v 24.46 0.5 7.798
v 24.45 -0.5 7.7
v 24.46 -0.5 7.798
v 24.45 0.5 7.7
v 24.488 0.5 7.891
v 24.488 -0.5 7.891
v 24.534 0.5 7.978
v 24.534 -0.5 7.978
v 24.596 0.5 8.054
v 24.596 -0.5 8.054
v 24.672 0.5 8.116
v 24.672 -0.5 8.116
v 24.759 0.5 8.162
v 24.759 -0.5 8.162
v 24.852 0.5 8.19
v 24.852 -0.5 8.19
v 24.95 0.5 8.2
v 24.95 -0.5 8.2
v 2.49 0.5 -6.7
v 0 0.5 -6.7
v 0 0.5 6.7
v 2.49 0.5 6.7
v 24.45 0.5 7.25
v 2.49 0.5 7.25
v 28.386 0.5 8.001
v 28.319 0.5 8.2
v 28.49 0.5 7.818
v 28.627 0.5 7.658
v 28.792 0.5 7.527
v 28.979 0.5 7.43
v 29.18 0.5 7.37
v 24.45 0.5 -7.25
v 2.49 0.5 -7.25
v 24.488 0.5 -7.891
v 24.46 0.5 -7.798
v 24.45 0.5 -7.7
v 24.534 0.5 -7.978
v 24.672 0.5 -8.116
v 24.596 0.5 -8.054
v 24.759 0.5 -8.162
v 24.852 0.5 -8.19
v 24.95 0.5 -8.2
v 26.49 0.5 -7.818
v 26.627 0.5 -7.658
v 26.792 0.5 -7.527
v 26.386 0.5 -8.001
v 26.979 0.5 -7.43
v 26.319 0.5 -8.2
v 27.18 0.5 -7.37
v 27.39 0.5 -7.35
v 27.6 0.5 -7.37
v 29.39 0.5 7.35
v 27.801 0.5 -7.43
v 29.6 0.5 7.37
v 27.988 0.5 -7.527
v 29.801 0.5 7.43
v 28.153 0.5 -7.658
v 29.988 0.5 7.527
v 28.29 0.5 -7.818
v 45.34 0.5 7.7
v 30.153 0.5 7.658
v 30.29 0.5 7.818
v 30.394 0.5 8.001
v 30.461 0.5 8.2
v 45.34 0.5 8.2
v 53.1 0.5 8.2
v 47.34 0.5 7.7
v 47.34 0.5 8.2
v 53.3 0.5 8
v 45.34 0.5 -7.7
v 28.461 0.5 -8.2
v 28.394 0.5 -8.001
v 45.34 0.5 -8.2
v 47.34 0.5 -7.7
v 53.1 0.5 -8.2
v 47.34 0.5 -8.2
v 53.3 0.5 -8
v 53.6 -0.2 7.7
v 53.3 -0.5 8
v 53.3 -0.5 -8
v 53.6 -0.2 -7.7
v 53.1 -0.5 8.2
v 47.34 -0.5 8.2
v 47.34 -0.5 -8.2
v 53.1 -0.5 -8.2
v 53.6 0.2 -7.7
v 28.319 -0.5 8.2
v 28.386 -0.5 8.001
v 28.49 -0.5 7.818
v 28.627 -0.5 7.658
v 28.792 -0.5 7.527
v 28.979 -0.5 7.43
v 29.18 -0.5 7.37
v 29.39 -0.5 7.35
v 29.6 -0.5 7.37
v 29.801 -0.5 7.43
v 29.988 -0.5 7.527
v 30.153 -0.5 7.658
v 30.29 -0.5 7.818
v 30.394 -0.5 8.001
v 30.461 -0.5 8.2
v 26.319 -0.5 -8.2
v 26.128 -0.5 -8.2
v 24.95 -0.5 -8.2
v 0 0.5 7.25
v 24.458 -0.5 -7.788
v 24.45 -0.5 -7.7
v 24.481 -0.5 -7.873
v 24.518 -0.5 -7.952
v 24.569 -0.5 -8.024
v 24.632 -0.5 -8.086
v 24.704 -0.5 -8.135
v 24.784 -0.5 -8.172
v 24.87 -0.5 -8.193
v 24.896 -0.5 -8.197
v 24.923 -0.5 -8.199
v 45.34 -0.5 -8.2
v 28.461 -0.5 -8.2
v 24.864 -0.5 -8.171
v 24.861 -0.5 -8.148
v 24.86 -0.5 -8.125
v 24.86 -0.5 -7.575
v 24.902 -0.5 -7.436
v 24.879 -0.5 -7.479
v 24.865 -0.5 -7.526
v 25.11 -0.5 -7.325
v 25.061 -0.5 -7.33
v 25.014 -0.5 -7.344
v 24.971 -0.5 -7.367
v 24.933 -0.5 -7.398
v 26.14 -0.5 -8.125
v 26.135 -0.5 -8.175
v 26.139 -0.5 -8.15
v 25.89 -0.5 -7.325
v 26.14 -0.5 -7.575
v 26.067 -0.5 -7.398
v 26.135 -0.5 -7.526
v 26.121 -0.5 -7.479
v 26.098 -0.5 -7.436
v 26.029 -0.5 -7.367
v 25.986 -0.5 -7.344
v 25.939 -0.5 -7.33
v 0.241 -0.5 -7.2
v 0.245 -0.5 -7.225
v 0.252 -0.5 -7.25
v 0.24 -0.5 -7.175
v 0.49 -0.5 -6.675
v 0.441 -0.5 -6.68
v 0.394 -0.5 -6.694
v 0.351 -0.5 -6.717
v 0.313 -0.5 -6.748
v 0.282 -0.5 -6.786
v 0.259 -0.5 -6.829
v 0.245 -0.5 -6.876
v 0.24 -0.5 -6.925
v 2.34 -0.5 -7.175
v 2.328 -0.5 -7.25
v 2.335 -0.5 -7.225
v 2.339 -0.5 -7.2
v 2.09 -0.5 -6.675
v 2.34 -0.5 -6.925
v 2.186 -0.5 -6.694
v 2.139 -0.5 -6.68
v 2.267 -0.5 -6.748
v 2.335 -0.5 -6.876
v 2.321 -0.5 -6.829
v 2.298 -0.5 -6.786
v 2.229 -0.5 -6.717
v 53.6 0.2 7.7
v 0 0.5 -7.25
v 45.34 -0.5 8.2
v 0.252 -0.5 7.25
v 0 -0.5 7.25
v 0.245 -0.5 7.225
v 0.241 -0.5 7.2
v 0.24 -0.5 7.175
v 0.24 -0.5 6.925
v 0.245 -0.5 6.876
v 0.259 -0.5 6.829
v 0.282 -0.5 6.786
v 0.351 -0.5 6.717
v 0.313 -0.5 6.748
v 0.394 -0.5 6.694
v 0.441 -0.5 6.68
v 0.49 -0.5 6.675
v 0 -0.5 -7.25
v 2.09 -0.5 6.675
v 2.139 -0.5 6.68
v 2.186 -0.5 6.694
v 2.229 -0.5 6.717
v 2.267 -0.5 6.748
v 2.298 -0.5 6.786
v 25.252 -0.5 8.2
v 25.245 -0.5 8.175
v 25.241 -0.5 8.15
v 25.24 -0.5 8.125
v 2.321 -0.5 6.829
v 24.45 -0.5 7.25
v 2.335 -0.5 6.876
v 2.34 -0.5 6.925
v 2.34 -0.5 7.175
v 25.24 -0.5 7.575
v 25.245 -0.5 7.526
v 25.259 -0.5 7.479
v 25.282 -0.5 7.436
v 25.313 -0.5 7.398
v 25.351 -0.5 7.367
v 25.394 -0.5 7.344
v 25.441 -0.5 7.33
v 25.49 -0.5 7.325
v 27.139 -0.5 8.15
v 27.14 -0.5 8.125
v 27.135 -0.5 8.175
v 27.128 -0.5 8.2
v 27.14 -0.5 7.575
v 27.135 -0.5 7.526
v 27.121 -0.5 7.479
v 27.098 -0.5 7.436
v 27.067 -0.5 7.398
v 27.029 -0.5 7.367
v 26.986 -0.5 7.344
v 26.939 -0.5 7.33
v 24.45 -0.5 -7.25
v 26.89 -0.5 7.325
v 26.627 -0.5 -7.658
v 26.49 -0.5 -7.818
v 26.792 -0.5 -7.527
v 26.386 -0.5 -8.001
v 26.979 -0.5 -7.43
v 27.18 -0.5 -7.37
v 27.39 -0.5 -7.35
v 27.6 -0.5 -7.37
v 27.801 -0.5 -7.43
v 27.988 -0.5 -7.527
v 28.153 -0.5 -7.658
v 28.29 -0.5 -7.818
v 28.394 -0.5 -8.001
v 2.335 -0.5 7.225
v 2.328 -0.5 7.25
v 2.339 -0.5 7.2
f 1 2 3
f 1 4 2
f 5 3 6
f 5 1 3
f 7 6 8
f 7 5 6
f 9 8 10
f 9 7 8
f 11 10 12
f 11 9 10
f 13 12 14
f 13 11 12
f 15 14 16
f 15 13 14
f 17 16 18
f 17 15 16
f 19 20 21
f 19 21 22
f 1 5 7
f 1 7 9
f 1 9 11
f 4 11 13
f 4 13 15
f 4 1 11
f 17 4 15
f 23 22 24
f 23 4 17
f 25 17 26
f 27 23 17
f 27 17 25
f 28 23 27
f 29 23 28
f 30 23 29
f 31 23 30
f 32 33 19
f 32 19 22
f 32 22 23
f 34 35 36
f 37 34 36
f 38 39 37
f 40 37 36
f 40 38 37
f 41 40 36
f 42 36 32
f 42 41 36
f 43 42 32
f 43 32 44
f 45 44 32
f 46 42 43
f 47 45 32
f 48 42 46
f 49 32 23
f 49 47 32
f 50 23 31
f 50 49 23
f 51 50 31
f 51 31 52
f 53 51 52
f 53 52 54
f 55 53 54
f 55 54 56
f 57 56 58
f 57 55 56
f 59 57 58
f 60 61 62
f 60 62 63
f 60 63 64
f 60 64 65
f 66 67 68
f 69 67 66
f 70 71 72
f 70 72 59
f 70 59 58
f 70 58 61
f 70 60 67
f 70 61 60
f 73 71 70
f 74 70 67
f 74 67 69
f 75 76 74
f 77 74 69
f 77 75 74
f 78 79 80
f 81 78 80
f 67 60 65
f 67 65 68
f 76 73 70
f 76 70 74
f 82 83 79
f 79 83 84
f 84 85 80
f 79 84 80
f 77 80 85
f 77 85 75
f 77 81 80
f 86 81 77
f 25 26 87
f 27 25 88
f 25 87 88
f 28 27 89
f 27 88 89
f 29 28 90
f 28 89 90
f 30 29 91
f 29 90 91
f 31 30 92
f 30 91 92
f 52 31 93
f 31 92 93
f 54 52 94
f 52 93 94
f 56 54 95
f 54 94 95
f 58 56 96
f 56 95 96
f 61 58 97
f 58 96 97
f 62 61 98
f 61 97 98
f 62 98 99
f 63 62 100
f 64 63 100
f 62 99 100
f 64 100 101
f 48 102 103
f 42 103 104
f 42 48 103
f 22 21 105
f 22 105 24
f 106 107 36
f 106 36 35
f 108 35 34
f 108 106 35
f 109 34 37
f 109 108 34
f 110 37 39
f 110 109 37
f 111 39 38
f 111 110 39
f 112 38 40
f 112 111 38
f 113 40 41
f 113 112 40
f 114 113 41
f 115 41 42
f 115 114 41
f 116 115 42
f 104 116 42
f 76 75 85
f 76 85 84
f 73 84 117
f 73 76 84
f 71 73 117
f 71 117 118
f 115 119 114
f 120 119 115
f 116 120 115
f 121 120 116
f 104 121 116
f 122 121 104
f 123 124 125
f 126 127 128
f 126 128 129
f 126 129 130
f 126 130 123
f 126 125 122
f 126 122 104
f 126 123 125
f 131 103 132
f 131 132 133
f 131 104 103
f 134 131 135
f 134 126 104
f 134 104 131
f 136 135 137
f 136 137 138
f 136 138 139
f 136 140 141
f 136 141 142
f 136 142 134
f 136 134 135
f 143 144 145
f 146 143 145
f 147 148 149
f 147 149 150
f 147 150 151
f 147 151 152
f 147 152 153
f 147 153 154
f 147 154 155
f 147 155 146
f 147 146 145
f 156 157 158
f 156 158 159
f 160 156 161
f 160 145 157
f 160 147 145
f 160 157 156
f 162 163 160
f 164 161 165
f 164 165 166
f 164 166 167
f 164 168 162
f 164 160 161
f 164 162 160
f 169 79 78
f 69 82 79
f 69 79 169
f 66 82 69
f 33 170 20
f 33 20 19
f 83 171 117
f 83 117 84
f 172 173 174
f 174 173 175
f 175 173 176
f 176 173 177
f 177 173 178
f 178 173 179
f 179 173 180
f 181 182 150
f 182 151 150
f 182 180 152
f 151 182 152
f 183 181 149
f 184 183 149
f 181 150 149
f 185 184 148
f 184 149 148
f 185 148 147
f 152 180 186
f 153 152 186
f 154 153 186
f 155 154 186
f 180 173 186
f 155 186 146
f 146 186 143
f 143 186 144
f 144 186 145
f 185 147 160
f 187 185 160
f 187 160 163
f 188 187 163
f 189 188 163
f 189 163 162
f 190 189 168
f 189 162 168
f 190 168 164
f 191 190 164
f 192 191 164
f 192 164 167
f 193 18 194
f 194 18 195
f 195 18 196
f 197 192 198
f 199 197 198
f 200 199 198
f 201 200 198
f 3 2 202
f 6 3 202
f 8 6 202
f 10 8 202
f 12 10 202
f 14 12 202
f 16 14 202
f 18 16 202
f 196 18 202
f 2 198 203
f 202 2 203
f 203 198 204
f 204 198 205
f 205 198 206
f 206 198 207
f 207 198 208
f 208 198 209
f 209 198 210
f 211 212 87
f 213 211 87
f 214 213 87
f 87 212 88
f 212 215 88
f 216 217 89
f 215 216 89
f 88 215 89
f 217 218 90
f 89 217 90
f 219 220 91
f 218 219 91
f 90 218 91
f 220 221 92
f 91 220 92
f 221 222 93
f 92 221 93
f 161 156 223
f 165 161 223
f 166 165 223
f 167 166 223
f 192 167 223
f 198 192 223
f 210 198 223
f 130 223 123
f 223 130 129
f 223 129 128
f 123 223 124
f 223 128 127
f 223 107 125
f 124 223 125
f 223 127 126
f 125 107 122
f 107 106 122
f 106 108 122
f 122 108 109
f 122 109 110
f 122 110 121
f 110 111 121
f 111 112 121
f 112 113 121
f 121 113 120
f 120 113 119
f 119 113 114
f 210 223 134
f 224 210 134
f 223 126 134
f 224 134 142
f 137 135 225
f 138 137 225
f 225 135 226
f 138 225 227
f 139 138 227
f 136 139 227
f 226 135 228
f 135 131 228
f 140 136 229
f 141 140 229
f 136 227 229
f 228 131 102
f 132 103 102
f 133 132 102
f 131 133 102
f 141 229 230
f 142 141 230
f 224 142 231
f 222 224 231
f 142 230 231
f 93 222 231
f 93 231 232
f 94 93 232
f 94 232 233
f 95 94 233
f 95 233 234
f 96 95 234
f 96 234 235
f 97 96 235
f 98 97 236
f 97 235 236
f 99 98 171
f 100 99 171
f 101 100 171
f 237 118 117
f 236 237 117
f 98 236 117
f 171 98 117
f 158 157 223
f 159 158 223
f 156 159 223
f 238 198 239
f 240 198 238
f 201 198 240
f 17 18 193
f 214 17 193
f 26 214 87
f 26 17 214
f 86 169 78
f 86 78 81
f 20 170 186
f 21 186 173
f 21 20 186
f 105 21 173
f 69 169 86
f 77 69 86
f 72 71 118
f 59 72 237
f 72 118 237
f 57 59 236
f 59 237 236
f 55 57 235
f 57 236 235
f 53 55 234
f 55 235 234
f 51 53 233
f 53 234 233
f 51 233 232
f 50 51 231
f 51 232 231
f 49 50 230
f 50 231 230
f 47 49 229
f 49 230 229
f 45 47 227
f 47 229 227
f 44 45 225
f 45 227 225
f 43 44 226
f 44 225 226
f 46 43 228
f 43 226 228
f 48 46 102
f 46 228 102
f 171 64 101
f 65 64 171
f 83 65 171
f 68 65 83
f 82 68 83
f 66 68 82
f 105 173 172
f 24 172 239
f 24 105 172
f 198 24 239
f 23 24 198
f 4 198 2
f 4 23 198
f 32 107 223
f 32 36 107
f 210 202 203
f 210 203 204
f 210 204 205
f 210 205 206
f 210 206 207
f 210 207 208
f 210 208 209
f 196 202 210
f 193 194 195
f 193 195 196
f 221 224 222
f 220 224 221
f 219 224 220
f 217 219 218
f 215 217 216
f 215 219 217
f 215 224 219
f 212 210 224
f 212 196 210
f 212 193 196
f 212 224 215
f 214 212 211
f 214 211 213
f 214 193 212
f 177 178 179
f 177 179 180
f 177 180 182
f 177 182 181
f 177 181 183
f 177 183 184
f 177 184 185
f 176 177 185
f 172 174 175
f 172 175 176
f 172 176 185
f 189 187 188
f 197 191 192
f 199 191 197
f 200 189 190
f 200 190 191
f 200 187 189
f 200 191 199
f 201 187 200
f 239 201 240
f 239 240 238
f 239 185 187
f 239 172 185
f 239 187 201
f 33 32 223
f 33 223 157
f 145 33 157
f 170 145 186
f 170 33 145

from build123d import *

# Parameters (mm, degrees)
BOSS_EXTRUDE1_DEPTH = 0.5
CHAMFER3_SIZE       = 0.5
SKETCH2_R           = 1.1
CUT_EXTRUDE1_DEPTH  = 55.232831385
FILLET1_R           = 0.5
SKETCH8_W           = 2.49
SKETCH8_H           = 0.55
SKETCH8_W_2         = 2
SKETCH8_H_2         = 0.5
CUT_EXTRUDE3_DEPTH  = 0.0001
SKETCH9_W           = 2
SKETCH9_H           = 16.4
CUT_EXTRUDE4_DEPTH  = 0.0001
CHAMFER4_SIZE       = 0.3


with BuildPart() as part:
    # Sketch1 → Boss-Extrude1 (new, symmetric)
    with BuildSketch(Plane(origin=(0, 0, 0), x_dir=(1, 0, 0), z_dir=(0, 1, 0))):
        Polygon((0, 7.25), (0, -7.25), (24.45, -7.25), (24.45, -8.2), (53.6, -8.2), (53.6, 8.2), (24.45, 8.2), (24.45, 7.25), align=None)
    extrude(amount=BOSS_EXTRUDE1_DEPTH, both=True)

    # Chamfer3
    chamfer3_edges = [part.edges().sort_by_distance(p)[0] for p in [
        (53.6, 0, -8.2),
        (53.6, 0, 8.2),
    ]]
    chamfer(chamfer3_edges, length=CHAMFER3_SIZE)

    # Sketch2 → Cut-Extrude1 (cut, through all)
    with BuildSketch(Plane.XZ.offset(0.5)):
        with Locations((29.39, 8.45)):
            Circle(SKETCH2_R)
        with Locations((27.39, -8.45)):
            Circle(SKETCH2_R)
    extrude(amount=-CUT_EXTRUDE1_DEPTH, mode=Mode.SUBTRACT)

    # Fillet1
    fillet1_edges = [part.edges().sort_by_distance(p)[0] for p in [
        (24.45, 0, -8.2),
        (24.45, 0, 8.2),
    ]]
    fillet(fillet1_edges, radius=FILLET1_R)

    # Sketch8 → Cut-Extrude3 (cut)
    with BuildSketch(Plane(origin=(0, 0.5, 0), x_dir=(1, 0, 0), z_dir=(0, 1, 0))):
        with Locations((1.245, -6.975)):
            Rectangle(SKETCH8_W, SKETCH8_H)
        with Locations((1.245, 6.975)):
            Rectangle(SKETCH8_W, SKETCH8_H)
        with Locations((46.34, -7.95)):
            Rectangle(SKETCH8_W_2, SKETCH8_H_2)
        with Locations((46.34, 7.95)):
            Rectangle(SKETCH8_W_2, SKETCH8_H_2)
    extrude(amount=-CUT_EXTRUDE3_DEPTH, mode=Mode.SUBTRACT)

    # Sketch9 → Cut-Extrude4 (cut)
    with BuildSketch(Plane.XZ.offset(0.5)):
        with BuildLine():
            Line((2.09, 7.425), (0.49, 7.425))
            ThreePointArc((0.49, 7.425), (0.313223305, 7.351776695), (0.24, 7.175))
            Line((0.24, 7.175), (0.24, 6.925))
            ThreePointArc((0.24, 6.925), (0.313223305, 6.748223305), (0.49, 6.675))
            Line((0.49, 6.675), (2.09, 6.675))
            ThreePointArc((2.09, 6.675), (2.266776695, 6.748223305), (2.34, 6.925))
            Line((2.34, 6.925), (2.34, 7.175))
            ThreePointArc((2.34, 7.175), (2.266776695, 7.351776695), (2.09, 7.425))
        make_face()
        with BuildLine():
            Line((2.34, -7.175), (2.34, -6.925))
            ThreePointArc((2.34, -6.925), (2.266776695, -6.748223305), (2.09, -6.675))
            Line((2.09, -6.675), (0.49, -6.675))
            ThreePointArc((0.49, -6.675), (0.313223305, -6.748223305), (0.24, -6.925))
            Line((0.24, -6.925), (0.24, -7.175))
            ThreePointArc((0.24, -7.175), (0.313223305, -7.351776695), (0.49, -7.425))
            Line((0.49, -7.425), (2.09, -7.425))
            ThreePointArc((2.09, -7.425), (2.266776695, -7.351776695), (2.34, -7.175))
        make_face()
        with BuildLine():
            Line((26.14, -8.125), (26.14, -7.575))
            ThreePointArc((26.14, -7.575), (26.066776695, -7.398223305), (25.89, -7.325))
            Line((25.89, -7.325), (25.11, -7.325))
            ThreePointArc((25.11, -7.325), (24.933223305, -7.398223305), (24.86, -7.575))
            Line((24.86, -7.575), (24.86, -8.125))
            ThreePointArc((24.86, -8.125), (24.933223305, -8.301776695), (25.11, -8.375))
            Line((25.11, -8.375), (25.89, -8.375))
            ThreePointArc((25.89, -8.375), (26.066776695, -8.301776695), (26.14, -8.125))
        make_face()
        with Locations((46.34, 0)):
            Rectangle(SKETCH9_W, SKETCH9_H)
        with BuildLine():
            Line((25.49, 7.325), (26.89, 7.325))
            ThreePointArc((26.89, 7.325), (27.066776695, 7.398223305), (27.14, 7.575))
            Line((27.14, 7.575), (27.14, 8.125))
            ThreePointArc((27.14, 8.125), (27.066776695, 8.301776695), (26.89, 8.375))
            Line((26.89, 8.375), (25.49, 8.375))
            ThreePointArc((25.49, 8.375), (25.313223305, 8.301776695), (25.24, 8.125))
            Line((25.24, 8.125), (25.24, 7.575))
            ThreePointArc((25.24, 7.575), (25.313223305, 7.398223305), (25.49, 7.325))
        make_face()
    extrude(amount=-CUT_EXTRUDE4_DEPTH, mode=Mode.SUBTRACT)

    # Chamfer4
    chamfer4_edges = [part.edges().sort_by_distance(p)[0] for p in [
        (53.6, -0.5, 0),
        (53.6, 0.5, 0),
    ]]
    chamfer(chamfer4_edges, length=CHAMFER4_SIZE)


solid = part.part
